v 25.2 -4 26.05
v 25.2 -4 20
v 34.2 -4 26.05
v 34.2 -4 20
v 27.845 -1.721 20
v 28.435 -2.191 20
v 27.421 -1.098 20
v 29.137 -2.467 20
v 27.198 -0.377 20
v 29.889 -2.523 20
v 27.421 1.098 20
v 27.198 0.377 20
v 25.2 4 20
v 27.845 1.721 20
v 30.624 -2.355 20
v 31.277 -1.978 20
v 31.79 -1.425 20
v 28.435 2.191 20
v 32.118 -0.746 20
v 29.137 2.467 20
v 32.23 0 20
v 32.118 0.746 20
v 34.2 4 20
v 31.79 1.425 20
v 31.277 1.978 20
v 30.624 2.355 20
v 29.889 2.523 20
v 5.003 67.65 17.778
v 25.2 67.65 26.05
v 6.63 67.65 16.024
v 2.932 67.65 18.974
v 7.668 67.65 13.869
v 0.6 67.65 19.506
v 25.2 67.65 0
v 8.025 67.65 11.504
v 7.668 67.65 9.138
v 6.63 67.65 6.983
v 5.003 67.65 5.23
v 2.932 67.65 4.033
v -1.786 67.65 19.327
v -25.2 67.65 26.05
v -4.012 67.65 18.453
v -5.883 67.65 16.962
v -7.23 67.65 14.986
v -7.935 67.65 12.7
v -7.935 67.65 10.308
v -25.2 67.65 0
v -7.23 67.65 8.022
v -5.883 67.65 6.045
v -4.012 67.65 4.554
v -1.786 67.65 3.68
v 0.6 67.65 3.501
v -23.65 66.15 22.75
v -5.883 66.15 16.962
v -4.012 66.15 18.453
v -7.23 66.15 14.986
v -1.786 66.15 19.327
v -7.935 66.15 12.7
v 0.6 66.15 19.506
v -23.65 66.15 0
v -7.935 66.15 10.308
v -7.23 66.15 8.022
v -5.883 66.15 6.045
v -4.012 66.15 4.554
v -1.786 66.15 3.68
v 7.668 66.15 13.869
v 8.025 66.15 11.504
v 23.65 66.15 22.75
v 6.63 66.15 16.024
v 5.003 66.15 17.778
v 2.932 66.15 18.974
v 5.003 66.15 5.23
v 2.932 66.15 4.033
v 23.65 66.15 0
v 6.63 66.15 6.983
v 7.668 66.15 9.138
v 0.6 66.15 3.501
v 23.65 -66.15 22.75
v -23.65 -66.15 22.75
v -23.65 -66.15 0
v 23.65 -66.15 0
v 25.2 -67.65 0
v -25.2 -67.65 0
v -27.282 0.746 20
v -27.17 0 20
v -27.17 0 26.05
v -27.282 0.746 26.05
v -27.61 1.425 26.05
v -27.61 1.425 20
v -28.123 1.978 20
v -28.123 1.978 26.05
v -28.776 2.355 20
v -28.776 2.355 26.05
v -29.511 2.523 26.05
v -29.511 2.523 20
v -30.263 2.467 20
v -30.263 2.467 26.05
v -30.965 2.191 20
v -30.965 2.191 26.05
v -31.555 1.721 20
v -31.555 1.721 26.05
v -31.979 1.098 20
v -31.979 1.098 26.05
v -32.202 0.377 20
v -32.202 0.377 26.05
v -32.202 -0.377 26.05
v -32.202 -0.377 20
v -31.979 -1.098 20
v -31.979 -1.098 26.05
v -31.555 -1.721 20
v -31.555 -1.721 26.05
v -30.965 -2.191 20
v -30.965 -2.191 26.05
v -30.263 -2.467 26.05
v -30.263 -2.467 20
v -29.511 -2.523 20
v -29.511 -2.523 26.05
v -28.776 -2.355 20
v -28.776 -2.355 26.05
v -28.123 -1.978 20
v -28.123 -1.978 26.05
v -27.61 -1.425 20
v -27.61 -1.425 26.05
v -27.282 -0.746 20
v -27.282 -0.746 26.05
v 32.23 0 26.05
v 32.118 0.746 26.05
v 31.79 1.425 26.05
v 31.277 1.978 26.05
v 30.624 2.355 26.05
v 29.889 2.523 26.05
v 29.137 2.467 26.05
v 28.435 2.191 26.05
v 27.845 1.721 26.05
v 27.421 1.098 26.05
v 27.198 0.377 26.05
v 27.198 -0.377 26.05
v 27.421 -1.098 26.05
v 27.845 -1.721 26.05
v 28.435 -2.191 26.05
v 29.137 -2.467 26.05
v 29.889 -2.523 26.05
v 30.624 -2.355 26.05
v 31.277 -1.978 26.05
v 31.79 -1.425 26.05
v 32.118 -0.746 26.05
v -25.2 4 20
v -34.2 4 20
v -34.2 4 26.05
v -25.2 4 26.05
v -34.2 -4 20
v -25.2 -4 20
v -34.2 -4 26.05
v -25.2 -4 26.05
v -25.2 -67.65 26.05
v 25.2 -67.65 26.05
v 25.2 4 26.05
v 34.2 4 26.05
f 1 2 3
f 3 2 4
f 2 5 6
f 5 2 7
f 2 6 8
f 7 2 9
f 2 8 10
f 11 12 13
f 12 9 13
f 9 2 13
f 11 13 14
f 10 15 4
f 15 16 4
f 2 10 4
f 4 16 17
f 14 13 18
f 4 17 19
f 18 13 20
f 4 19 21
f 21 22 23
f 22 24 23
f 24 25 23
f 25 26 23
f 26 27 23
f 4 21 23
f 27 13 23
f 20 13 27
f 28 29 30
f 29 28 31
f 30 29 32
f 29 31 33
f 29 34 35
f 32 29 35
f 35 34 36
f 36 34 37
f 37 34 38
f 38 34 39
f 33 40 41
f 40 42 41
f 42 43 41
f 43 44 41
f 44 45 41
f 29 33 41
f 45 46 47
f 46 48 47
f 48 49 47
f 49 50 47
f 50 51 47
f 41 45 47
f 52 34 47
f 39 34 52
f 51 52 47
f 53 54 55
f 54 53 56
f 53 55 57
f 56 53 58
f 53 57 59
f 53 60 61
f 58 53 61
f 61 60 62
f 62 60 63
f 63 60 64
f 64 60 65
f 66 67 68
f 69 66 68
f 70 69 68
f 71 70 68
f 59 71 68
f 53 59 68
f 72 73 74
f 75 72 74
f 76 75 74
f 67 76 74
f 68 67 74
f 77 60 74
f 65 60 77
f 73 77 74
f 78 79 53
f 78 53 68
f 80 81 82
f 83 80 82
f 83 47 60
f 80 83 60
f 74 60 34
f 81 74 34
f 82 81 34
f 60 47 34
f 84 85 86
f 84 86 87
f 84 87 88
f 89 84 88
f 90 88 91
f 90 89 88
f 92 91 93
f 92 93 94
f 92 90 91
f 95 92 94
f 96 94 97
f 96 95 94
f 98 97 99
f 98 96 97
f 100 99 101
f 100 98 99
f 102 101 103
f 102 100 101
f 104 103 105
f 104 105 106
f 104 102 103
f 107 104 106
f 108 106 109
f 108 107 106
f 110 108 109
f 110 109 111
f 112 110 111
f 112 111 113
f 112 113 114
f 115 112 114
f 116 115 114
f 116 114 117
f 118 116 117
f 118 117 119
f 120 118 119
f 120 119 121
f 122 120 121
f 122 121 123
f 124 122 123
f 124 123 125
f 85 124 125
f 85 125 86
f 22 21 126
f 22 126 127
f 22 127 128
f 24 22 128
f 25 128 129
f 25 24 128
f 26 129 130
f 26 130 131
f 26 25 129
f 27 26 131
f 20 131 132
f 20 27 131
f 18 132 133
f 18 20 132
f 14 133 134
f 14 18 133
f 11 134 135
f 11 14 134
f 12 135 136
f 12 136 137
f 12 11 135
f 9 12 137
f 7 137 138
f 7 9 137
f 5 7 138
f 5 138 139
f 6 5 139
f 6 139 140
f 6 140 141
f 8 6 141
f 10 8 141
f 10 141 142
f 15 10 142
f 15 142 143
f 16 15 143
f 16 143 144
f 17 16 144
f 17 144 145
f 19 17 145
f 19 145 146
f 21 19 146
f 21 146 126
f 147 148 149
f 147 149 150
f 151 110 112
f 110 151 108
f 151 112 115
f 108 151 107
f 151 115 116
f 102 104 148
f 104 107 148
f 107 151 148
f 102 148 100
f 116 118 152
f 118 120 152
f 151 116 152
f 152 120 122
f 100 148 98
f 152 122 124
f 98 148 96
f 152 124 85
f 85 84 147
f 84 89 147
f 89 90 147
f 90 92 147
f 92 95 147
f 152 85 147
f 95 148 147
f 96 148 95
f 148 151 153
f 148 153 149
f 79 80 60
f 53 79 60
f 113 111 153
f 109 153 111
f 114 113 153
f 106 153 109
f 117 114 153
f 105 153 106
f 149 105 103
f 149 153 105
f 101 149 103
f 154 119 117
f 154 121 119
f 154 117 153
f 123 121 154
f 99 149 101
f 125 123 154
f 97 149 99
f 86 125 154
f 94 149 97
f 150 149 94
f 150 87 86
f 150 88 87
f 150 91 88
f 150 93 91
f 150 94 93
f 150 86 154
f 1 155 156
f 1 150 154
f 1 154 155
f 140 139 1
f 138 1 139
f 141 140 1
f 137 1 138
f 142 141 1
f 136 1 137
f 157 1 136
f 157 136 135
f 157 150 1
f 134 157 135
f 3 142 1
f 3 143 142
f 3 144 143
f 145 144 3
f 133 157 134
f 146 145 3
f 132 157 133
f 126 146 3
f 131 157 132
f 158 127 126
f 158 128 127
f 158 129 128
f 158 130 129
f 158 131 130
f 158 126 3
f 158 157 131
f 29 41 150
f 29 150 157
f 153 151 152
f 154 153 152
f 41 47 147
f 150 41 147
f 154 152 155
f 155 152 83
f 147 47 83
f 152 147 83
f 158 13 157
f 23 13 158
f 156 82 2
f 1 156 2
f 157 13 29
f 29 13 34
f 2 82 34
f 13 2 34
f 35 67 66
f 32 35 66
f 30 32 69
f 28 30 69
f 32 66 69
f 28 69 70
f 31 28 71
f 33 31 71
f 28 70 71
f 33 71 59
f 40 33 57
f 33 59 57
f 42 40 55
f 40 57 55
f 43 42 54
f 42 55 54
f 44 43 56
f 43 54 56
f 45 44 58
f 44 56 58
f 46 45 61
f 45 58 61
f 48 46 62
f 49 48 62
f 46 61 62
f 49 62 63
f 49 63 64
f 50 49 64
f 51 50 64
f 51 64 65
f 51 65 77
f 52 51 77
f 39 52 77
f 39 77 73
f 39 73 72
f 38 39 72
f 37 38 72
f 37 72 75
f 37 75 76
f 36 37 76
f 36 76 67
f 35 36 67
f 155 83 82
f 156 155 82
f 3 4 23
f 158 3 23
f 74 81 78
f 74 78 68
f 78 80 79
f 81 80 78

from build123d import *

# Parameters (mm, degrees)
F0_W     = 9
F0_H     = 8
F0_R     = 2.53
F1_DEPTH = 26.05
F2_W     = 47.3
F2_H     = 132.3
F3_DEPTH = 22.75
F4_DEPTH = 15
F5_DEPTH = 20
F6_DEPTH = 20
F7_R     = 8.024884
F8_DEPTH = 100


with BuildPart() as f1:
    # F0 (on Top) → F1 (new body)
    with BuildSketch(Plane.XY):
        Polygon((-25.2, -67.65), (25.2, -67.65), (25.2, -12.552832), (25.2, -4), (25.2, 4), (25.2, 67.65), (-25.2, 67.65), (-25.2, 4), (-25.2, -4), align=None)
        with Locations((-29.7, 0)):
            Rectangle(F0_W, F0_H)
        with Locations((-29.7, 0)):
            Circle(F0_R, mode=Mode.SUBTRACT)
        with Locations((29.7, 0)):
            Rectangle(F0_W, F0_H)
        with Locations((29.7, 0)):
            Circle(F0_R, mode=Mode.SUBTRACT)
    extrude(amount=F1_DEPTH)

    # F2 (on Top) → F3 (cut)
    with BuildSketch(Plane.XY):
        Rectangle(F2_W, F2_H)
    extrude(amount=F3_DEPTH, mode=Mode.SUBTRACT)

    # F0 (on Top) → F4 (join)
    with BuildSketch(Plane.XY):
        with Locations((29.7, 0)):
            Rectangle(F0_W, F0_H)
        with Locations((29.7, 0)):
            Circle(F0_R, mode=Mode.SUBTRACT)
    extrude(amount=F4_DEPTH)

    # F0 (on Top) → F5 (cut)
    with BuildSketch(Plane.XY):
        with Locations((29.7, 0)):
            Rectangle(F0_W, F0_H)
        with Locations((29.7, 0)):
            Circle(F0_R, mode=Mode.SUBTRACT)
    extrude(amount=F5_DEPTH, mode=Mode.SUBTRACT)

    # F0 (on Top) → F6 (cut)
    with BuildSketch(Plane.XY):
        with Locations((-29.7, 0)):
            Rectangle(F0_W, F0_H)
        with Locations((-29.7, 0)):
            Circle(F0_R, mode=Mode.SUBTRACT)
    extrude(amount=F6_DEPTH, mode=Mode.SUBTRACT)

    # F7 (on Front) → F8 (cut)
    with BuildSketch(Plane.XZ):
        with Locations((0, 11.503653)):
            Circle(F7_R)
    extrude(amount=-F8_DEPTH, mode=Mode.SUBTRACT)


solid = f1.part
